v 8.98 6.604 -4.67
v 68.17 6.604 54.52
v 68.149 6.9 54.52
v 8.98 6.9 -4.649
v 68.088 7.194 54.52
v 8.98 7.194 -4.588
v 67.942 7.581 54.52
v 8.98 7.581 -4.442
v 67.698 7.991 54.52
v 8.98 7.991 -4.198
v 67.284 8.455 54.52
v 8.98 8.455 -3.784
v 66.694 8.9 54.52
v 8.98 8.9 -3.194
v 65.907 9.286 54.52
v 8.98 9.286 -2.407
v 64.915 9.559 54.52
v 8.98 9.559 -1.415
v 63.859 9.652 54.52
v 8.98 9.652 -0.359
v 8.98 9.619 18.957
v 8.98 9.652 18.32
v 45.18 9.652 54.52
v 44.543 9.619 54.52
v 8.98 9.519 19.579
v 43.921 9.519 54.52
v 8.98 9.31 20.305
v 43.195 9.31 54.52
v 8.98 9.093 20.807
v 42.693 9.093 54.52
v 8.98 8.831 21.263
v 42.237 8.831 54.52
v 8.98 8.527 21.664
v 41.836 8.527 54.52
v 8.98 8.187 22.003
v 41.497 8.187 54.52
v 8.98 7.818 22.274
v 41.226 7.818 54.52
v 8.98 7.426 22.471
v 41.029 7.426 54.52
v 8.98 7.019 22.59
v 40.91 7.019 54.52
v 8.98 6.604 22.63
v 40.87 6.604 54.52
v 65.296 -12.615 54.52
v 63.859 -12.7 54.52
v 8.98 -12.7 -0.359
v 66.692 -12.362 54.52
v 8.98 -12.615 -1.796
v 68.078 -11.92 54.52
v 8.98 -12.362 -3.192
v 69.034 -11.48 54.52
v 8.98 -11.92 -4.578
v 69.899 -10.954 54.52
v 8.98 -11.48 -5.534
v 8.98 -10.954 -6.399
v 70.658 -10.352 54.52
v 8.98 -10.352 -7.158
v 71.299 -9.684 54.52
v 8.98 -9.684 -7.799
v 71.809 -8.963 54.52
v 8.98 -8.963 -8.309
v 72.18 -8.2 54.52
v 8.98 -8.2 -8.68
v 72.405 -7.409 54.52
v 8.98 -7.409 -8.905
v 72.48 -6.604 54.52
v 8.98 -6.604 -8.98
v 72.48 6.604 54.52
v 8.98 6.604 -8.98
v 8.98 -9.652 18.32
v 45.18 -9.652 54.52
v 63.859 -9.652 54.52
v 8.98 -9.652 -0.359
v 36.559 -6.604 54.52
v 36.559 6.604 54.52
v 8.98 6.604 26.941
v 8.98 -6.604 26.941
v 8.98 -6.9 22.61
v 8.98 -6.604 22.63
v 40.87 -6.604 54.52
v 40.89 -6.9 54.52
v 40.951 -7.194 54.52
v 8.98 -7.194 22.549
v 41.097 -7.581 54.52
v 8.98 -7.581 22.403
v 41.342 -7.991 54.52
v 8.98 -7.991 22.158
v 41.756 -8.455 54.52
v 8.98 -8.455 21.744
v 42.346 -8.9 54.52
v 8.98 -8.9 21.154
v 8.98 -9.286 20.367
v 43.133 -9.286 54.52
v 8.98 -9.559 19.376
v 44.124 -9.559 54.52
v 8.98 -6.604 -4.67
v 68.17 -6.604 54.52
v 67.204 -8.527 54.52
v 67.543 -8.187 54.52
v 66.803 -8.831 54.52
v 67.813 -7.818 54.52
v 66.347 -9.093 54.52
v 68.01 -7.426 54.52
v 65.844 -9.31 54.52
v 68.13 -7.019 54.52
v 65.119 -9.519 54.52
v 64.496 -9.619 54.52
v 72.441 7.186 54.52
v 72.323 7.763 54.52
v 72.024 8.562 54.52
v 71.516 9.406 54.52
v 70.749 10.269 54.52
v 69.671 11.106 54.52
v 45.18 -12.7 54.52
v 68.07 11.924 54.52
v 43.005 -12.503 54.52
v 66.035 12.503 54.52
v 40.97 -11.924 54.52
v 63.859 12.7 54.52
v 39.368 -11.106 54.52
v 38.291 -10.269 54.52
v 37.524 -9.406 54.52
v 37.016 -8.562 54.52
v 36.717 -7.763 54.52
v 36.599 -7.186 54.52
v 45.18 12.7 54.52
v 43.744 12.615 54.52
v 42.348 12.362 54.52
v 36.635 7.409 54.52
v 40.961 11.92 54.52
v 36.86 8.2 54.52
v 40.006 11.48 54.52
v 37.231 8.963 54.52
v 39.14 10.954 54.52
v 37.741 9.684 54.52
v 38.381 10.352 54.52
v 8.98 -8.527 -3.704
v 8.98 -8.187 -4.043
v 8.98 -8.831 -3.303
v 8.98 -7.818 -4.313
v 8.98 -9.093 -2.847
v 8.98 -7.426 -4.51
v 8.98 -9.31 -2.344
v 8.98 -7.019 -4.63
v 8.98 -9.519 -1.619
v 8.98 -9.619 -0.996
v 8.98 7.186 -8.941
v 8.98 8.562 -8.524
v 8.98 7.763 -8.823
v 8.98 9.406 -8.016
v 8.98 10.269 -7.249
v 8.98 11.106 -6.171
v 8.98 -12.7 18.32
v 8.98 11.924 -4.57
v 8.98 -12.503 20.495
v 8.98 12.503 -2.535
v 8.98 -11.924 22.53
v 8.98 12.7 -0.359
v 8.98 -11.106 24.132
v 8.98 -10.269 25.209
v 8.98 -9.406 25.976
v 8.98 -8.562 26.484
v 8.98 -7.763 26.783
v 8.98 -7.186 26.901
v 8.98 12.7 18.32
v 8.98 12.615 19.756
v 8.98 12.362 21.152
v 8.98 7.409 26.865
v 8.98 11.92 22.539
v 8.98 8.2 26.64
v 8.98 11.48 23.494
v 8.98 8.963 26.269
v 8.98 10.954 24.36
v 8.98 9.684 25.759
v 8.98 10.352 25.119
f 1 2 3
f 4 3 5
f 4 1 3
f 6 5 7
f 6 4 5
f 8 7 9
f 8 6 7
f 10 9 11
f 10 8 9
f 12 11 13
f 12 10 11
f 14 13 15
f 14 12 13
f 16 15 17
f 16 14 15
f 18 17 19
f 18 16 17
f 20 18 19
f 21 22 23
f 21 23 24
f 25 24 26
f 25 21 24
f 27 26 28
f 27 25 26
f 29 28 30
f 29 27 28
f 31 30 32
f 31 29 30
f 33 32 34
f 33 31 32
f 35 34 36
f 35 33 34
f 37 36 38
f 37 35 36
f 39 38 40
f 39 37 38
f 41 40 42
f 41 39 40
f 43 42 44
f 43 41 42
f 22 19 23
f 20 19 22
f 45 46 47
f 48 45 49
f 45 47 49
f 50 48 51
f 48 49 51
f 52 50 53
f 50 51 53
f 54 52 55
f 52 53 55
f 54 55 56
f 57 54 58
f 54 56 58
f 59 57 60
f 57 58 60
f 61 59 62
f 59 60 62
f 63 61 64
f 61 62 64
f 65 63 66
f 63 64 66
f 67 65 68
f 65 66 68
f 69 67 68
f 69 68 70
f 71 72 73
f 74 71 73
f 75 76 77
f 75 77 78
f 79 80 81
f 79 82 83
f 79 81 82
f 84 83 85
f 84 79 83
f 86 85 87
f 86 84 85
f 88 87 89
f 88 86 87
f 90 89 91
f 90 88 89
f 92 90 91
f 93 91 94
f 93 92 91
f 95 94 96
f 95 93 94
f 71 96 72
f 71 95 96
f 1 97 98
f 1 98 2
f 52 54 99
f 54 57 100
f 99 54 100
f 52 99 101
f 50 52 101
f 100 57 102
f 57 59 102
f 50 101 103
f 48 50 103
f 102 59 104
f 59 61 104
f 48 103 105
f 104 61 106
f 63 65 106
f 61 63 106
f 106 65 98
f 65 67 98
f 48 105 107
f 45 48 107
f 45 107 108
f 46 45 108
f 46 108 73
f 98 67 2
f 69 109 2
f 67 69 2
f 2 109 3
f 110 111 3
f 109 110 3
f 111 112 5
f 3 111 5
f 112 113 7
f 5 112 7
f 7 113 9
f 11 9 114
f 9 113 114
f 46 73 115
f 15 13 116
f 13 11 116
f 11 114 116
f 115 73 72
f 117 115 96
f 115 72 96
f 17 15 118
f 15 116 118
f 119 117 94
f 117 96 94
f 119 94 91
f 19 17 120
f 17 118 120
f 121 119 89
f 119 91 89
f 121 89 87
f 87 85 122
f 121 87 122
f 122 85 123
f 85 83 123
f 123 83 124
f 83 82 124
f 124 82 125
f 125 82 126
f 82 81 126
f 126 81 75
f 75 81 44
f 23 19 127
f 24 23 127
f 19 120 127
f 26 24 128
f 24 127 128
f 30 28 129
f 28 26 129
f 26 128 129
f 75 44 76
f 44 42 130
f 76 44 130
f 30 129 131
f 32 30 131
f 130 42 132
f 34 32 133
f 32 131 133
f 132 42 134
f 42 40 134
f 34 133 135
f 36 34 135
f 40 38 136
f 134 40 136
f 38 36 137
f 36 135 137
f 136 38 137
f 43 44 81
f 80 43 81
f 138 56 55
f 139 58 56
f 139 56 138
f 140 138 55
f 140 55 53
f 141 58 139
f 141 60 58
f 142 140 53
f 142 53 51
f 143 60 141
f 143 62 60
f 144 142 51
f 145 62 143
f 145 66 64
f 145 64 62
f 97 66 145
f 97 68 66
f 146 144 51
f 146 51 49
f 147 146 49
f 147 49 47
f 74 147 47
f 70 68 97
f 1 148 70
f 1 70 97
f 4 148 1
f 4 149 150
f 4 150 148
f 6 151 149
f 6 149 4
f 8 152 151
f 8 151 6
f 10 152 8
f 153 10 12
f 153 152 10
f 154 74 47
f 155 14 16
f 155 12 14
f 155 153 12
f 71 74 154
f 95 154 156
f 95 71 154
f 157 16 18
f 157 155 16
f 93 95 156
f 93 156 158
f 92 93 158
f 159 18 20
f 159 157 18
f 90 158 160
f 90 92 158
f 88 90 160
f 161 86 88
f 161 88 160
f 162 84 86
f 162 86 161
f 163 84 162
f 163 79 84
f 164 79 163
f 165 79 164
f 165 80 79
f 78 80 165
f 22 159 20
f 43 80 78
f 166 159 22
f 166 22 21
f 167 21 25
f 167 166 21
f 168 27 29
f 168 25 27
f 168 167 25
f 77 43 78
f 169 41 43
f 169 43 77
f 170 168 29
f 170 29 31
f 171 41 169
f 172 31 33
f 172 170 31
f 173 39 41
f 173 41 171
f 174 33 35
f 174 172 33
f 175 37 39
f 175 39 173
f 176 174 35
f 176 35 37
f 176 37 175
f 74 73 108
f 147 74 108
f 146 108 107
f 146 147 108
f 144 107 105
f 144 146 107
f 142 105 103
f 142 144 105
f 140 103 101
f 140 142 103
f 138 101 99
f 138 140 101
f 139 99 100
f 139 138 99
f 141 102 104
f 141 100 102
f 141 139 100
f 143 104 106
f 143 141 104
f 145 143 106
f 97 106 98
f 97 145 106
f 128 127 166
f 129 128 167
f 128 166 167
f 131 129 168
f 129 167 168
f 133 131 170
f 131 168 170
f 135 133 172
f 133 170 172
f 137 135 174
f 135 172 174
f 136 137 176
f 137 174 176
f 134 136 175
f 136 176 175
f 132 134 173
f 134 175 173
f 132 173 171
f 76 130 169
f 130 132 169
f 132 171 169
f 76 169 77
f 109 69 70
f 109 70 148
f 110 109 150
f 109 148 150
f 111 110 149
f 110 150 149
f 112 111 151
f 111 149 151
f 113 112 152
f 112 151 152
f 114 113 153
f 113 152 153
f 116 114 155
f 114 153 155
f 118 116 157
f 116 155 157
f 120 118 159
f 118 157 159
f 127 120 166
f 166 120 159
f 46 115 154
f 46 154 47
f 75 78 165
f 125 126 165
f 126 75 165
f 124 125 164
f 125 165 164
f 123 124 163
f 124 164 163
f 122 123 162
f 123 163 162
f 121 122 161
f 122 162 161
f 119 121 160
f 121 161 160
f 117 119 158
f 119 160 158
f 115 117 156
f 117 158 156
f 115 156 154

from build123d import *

# Parameters (mm, degrees)
SQ_RECT_TUBING_WELDMENT_PROFILES_SQ_TUBE_DEPTH = 89.802561211
CUT_EXTRUDE1_REACH                             = 107.603


with BuildPart() as part:
    # Sketch121 → Sq_rect_tubing_weldment_profiles SQ TUBE 1 X 1 X .120 WALL(1) (new body)
    with BuildSketch(Plane(origin=(0, 0, 0), x_dir=(0.7071067811865487, 8.862608652922434e-13, -0.7071067811865464), z_dir=(0.7071067811865464, -2.139623000789053e-12, 0.7071067811865487))):
        with BuildLine():
            Line((-6.604, -12.7), (6.604, -12.7))
            ThreePointArc((6.604, -12.7), (10.914522938, -10.914522938), (12.7, -6.604))
            Line((12.7, -6.604), (12.7, 6.604))
            ThreePointArc((12.7, 6.604), (10.914522938, 10.914522938), (6.604, 12.7))
            Line((6.604, 12.7), (-6.604, 12.7))
            ThreePointArc((-6.604, 12.7), (-10.914522938, 10.914522938), (-12.7, 6.604))
            Line((-12.7, 6.604), (-12.7, -6.604))
            ThreePointArc((-12.7, -6.604), (-10.914522938, -10.914522938), (-6.604, -12.7))
        make_face()
        with BuildLine():
            Line((-6.604, -9.652), (6.604, -9.652))
            ThreePointArc((6.604, -9.652), (8.759261469, -8.759261469), (9.652, -6.604))
            Line((9.652, -6.604), (9.652, 6.604))
            ThreePointArc((9.652, 6.604), (8.759261469, 8.759261469), (6.604, 9.652))
            Line((6.604, 9.652), (-6.604, 9.652))
            ThreePointArc((-6.604, 9.652), (-8.759261469, 8.759261469), (-9.652, 6.604))
            Line((-9.652, 6.604), (-9.652, -6.604))
            ThreePointArc((-9.652, -6.604), (-8.759261469, -8.759261469), (-6.604, -9.652))
        make_face(mode=Mode.SUBTRACT)
    extrude(amount=SQ_RECT_TUBING_WELDMENT_PROFILES_SQ_TUBE_DEPTH)

    # Cut-Extrude1: up to this face of the body (flat: up to its plane)
    cut_extrude1_end = Plane(part.part.faces().sort_by_distance((31.75, -12.7, 31.75))[0])
    # Sketch122 → Cut-Extrude1 (cut, up to the picked face)
    with BuildSketch(Plane(origin=(0, 12.7, 0), x_dir=(1, 0, 0), z_dir=(8.861583310299792e-13, 1.0, 2.139725535051317e-12)), mode=Mode.PRIVATE) as cut_extrude1_sk1:
        Polygon((8.980256121, 8.980256121), (8.980256121, -26.940768363), (-8.980256121, -8.980256121), align=None)
    cut_extrude1_tool1 = split(extrude(cut_extrude1_sk1.sketch, amount=-CUT_EXTRUDE1_REACH, mode=Mode.PRIVATE), bisect_by=cut_extrude1_end, keep=Keep.BOTH, mode=Mode.PRIVATE)
    # Sketch122 → Cut-Extrude1 (cut, up to the picked face)
    with BuildSketch(Plane(origin=(0, 12.7, 0), x_dir=(1, 0, 0), z_dir=(8.861583310299792e-13, 1.0, 2.139725535051317e-12)), mode=Mode.PRIVATE) as cut_extrude1_sk2:
        Polygon((72.480256121, -54.519743879), (36.559231637, -54.519743879), (54.519743879, -72.480256121), align=None)
    cut_extrude1_tool2 = split(extrude(cut_extrude1_sk2.sketch, amount=-CUT_EXTRUDE1_REACH, mode=Mode.PRIVATE), bisect_by=cut_extrude1_end, keep=Keep.BOTH, mode=Mode.PRIVATE)
    add(cut_extrude1_tool1.solids().sort_by(Axis((2.993419, 12.7, 8.980256), (-8.861583310299792e-13, -1.0, -2.139725535051317e-12)))[0], mode=Mode.SUBTRACT)
    add(cut_extrude1_tool2.solids().sort_by(Axis((54.519744, 12.7, 60.506581), (-8.861583310299792e-13, -1.0, -2.139725535051317e-12)))[0], mode=Mode.SUBTRACT)


solid = part.part
